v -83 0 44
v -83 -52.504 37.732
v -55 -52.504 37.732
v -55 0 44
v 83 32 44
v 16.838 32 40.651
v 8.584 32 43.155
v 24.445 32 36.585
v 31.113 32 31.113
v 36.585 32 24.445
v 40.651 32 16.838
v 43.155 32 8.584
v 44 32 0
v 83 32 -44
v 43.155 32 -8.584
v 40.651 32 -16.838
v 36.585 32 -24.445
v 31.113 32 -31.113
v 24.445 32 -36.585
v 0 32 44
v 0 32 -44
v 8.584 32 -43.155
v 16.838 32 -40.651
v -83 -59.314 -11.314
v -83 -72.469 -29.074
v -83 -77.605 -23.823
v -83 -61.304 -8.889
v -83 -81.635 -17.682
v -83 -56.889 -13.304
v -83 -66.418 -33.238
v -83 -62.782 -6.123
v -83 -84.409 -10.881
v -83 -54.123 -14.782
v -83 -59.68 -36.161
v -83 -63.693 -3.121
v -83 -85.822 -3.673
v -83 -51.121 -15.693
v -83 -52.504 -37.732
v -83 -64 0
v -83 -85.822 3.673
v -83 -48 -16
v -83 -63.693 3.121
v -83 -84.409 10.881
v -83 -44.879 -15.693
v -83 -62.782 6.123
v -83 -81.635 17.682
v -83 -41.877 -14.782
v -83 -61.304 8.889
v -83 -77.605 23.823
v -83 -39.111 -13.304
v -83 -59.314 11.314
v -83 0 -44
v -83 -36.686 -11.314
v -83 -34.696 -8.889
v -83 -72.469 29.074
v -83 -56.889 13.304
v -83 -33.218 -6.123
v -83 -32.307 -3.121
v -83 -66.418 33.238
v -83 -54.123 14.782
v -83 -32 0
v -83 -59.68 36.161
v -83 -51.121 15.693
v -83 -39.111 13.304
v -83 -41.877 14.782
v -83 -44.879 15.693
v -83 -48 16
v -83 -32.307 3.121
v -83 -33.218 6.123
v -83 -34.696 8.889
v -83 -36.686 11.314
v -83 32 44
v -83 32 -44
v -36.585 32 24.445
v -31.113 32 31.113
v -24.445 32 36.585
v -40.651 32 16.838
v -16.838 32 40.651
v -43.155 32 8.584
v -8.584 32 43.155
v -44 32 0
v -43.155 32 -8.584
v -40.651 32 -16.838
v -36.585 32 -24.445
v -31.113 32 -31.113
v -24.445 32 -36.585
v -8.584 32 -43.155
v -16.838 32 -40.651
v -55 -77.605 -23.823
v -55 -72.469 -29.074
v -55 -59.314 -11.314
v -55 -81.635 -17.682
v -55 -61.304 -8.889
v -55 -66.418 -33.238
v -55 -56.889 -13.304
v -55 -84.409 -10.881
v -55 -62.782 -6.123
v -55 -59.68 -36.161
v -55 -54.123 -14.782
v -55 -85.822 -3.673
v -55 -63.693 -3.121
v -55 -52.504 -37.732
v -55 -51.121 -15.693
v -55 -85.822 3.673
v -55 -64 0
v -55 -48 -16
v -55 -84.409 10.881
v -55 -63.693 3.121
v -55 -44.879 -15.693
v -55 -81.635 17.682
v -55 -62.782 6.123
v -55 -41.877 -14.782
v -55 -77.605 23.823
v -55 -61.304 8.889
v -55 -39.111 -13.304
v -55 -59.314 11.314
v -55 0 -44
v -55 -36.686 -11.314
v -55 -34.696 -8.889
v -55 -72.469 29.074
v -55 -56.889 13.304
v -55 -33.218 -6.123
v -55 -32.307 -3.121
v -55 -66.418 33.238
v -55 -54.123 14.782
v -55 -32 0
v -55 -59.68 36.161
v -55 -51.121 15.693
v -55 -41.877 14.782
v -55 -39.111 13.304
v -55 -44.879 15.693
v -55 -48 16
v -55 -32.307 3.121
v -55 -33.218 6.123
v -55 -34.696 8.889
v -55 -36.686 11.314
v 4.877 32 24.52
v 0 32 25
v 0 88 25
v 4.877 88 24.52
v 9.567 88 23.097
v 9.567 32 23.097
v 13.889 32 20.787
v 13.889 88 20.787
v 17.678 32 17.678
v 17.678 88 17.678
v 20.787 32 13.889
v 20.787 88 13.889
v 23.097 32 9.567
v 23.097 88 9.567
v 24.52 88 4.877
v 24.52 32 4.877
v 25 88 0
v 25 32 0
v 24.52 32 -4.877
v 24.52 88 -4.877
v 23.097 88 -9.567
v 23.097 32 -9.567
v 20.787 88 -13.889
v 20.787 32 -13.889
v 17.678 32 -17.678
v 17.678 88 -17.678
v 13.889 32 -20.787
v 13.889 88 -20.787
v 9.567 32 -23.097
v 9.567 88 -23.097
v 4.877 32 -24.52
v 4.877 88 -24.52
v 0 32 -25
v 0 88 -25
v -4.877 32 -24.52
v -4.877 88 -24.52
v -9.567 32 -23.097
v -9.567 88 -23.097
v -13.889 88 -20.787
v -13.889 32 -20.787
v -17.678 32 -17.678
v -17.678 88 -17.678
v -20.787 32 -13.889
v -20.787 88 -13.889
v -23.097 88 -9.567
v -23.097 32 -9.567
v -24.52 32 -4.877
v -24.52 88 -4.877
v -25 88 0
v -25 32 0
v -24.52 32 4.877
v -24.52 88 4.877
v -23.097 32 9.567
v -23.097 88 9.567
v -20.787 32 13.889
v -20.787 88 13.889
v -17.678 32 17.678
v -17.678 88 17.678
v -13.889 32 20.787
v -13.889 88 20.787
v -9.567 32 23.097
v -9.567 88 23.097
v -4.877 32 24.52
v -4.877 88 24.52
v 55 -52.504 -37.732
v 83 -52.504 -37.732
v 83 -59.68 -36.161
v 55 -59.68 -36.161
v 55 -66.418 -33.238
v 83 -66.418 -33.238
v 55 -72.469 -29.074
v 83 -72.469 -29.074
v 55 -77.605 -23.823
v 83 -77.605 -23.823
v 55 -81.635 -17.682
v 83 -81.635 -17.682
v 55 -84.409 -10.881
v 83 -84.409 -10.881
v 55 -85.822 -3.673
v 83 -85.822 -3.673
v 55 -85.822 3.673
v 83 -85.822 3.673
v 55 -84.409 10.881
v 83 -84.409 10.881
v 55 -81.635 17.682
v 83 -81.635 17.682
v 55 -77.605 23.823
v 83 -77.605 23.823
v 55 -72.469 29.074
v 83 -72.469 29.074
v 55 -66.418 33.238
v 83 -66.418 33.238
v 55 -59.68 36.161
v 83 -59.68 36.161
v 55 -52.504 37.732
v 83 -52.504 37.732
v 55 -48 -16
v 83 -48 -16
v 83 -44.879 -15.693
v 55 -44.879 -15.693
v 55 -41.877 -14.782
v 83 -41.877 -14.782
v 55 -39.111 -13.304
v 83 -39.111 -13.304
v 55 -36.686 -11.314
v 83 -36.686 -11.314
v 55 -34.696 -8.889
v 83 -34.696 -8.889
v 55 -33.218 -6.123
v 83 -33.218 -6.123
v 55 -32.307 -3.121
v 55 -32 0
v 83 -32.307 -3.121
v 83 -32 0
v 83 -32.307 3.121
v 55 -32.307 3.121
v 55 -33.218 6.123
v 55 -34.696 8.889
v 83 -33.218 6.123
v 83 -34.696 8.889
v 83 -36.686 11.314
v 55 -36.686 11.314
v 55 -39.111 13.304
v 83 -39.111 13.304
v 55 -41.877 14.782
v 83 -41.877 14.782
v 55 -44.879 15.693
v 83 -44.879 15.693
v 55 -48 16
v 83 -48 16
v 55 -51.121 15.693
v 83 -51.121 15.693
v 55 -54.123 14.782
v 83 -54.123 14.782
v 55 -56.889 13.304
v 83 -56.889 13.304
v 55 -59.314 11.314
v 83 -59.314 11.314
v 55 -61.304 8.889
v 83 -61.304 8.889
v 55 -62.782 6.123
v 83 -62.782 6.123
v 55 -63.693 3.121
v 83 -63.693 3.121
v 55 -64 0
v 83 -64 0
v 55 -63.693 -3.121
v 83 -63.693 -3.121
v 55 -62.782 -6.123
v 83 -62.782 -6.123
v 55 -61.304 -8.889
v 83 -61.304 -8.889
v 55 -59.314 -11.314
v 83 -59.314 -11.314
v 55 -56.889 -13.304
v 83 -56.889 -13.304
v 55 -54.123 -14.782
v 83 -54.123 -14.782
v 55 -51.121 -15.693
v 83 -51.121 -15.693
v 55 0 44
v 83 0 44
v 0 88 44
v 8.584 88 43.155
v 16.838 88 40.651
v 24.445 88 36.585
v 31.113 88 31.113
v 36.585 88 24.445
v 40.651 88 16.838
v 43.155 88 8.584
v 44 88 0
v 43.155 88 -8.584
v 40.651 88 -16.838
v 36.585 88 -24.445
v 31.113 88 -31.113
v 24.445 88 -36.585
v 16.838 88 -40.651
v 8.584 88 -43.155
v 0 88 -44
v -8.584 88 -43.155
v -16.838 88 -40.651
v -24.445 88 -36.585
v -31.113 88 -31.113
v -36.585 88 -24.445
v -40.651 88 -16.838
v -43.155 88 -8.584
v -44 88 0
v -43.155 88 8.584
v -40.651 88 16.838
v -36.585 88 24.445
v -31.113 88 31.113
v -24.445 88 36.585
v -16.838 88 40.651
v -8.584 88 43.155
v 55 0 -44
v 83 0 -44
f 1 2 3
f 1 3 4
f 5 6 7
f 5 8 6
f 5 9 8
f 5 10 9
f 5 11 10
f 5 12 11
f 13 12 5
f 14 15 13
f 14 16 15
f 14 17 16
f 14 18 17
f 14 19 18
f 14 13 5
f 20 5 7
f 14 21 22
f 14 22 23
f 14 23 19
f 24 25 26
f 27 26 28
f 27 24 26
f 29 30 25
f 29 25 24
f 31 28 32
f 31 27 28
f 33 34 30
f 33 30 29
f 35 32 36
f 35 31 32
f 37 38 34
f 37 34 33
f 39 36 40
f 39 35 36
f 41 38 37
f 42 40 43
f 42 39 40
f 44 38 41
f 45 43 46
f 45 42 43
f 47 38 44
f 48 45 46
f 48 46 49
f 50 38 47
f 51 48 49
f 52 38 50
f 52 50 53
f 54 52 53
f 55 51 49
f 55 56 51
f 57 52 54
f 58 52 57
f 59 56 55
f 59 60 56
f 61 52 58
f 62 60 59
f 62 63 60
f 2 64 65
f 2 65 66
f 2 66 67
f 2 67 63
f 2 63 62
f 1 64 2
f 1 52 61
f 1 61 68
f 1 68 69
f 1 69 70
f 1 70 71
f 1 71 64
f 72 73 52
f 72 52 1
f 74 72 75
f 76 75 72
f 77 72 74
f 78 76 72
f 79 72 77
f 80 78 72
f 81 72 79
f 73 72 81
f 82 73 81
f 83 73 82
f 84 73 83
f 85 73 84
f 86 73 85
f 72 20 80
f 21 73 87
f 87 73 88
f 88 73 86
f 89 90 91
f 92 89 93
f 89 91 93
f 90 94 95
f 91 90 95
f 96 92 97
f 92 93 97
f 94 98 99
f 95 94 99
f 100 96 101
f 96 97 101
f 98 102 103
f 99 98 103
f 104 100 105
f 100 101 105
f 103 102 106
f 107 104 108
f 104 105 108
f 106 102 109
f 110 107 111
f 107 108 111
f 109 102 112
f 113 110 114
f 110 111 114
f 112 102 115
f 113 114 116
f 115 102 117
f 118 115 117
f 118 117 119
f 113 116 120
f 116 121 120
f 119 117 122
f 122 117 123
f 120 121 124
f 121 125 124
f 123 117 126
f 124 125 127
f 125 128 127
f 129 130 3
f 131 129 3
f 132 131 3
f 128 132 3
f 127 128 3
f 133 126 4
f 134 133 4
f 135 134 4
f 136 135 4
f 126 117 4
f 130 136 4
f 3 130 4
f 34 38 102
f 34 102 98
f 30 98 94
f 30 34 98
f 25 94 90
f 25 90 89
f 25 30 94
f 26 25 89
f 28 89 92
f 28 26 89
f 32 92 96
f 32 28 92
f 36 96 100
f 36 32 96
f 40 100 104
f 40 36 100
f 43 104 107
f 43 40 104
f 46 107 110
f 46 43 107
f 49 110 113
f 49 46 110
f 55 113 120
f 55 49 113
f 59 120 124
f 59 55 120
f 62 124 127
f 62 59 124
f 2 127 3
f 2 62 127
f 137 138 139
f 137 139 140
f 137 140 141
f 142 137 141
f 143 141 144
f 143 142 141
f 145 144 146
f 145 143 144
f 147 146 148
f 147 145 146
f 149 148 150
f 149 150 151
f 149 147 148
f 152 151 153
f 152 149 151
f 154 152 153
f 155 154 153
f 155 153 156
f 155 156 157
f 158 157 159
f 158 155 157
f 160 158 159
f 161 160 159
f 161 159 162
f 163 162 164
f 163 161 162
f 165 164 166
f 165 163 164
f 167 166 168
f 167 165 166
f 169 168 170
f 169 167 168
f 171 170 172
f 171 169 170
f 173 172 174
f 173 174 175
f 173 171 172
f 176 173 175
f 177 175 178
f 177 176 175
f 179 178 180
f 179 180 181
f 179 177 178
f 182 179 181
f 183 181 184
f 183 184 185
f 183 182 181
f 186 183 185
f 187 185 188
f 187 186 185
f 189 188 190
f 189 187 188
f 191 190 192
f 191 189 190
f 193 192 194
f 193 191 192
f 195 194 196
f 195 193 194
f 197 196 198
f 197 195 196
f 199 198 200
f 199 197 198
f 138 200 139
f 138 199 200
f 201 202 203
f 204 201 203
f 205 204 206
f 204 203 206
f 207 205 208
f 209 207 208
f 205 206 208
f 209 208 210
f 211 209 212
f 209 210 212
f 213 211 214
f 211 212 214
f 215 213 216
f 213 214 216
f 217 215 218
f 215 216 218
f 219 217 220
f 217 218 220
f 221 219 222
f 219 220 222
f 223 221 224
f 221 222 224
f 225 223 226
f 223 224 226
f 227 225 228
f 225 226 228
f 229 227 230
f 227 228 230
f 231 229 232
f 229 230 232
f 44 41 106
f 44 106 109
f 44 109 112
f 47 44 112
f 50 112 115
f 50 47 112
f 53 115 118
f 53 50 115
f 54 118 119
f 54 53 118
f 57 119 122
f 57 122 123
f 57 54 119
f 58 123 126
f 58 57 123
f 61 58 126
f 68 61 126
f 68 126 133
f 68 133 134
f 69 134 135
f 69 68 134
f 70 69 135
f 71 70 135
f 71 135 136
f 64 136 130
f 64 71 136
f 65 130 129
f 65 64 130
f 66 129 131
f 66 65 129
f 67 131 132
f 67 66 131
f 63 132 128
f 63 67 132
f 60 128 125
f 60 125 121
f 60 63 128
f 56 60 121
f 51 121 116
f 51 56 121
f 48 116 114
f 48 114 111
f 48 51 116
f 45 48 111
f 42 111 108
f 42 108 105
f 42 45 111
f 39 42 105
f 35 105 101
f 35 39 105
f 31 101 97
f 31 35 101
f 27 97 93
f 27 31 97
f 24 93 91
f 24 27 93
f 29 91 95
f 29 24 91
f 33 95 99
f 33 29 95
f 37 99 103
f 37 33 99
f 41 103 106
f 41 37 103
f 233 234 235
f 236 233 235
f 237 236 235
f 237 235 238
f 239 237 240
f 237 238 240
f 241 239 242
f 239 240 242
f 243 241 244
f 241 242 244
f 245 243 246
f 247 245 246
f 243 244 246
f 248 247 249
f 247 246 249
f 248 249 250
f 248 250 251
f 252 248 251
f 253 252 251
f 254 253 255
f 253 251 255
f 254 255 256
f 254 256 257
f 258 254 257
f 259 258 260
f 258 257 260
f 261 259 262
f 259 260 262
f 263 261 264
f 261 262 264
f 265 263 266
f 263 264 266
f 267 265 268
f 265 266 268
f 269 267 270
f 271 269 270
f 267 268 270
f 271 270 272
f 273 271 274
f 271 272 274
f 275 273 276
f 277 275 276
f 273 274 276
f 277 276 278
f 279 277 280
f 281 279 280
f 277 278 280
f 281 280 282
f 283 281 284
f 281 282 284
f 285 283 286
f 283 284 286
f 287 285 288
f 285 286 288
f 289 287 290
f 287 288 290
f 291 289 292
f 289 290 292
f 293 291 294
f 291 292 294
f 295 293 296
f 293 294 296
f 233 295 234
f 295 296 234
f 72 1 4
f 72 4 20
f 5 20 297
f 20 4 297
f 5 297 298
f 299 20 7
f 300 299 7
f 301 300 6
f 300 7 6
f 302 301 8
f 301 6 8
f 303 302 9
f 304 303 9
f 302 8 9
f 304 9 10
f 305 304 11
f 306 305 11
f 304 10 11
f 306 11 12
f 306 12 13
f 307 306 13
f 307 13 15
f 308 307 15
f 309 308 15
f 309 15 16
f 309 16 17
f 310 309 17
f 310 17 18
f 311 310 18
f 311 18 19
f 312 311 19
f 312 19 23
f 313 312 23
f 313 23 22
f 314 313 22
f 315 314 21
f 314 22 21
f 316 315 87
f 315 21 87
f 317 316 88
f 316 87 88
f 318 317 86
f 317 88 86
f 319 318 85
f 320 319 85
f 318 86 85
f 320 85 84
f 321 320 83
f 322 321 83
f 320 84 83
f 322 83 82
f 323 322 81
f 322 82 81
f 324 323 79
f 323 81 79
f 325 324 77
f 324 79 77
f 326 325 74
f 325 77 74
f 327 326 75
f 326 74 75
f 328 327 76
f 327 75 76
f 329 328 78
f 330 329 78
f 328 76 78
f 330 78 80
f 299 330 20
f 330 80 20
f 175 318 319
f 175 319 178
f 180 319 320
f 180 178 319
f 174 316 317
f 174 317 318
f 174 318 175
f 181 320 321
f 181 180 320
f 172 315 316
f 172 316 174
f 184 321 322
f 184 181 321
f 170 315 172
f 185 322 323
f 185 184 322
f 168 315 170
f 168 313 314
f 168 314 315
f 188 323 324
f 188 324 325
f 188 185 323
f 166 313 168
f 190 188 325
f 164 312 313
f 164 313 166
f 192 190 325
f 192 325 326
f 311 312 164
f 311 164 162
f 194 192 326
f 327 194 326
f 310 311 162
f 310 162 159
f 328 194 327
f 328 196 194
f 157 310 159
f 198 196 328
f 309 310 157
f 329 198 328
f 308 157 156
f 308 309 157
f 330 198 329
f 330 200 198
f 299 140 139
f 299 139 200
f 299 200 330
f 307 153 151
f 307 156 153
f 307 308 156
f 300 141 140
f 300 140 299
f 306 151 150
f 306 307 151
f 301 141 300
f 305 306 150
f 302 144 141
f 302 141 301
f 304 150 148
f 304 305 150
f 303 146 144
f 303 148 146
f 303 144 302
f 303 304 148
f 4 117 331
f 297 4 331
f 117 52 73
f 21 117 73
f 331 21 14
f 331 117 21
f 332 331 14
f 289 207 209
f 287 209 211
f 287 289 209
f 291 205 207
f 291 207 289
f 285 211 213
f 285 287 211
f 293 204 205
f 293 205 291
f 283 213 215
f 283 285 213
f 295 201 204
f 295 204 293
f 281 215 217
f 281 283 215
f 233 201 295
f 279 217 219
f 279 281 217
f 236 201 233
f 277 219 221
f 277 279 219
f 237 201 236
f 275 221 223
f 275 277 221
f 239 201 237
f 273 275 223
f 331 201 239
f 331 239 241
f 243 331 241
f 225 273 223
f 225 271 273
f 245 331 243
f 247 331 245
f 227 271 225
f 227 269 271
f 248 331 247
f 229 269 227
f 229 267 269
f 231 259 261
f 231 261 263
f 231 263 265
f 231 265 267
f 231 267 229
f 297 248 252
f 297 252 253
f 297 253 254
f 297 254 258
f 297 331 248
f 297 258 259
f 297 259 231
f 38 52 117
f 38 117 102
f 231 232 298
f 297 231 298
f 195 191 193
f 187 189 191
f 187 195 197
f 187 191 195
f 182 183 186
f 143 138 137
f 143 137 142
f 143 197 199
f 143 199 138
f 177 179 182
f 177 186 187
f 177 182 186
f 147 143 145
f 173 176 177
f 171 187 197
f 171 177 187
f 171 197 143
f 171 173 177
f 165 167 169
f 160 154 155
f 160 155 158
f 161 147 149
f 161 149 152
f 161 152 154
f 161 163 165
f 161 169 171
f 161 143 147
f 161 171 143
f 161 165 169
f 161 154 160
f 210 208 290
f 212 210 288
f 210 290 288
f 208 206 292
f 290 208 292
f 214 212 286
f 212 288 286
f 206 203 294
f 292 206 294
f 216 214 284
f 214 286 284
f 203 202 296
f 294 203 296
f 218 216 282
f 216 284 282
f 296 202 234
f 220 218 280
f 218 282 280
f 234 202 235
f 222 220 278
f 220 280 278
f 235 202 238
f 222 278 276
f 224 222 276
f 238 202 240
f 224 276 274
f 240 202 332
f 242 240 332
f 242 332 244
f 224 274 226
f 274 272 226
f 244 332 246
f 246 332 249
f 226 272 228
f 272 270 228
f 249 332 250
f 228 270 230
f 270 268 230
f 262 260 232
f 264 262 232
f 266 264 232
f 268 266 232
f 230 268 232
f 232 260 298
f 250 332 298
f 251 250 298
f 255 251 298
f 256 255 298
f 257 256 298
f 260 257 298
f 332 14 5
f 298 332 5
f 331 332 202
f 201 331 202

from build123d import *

# Parameters (mm, degrees)
SKETCH1_W           = 166
SKETCH1_H           = 88
BOSS_EXTRUDE1_DEPTH = 32
SKETCH2_R           = 44
SKETCH2_R_2         = 25
BOSS_EXTRUDE2_DEPTH = 56
SKETCH3_R           = 16
BOSS_EXTRUDE3_DEPTH = 28


with BuildPart() as part:
    # Sketch1 → Boss-Extrude1 (new body)
    with BuildSketch(Plane(origin=(0, 0, 0), x_dir=(1, 0, 0), z_dir=(0, 1, 0))):
        Rectangle(SKETCH1_W, SKETCH1_H)
    extrude(amount=BOSS_EXTRUDE1_DEPTH)

    # Sketch2 → Boss-Extrude2 (add)
    with BuildSketch(Plane(origin=(0, 32, 0), x_dir=(1, 0, 0), z_dir=(0, 1, 0))):
        with Locations(Location((0, 0, 0), (0, 0, 270))):
            Circle(SKETCH2_R)
        with Locations(Location((0, 0, 0), (0, 0, 270))):
            Circle(SKETCH2_R_2, mode=Mode.SUBTRACT)
    extrude(amount=BOSS_EXTRUDE2_DEPTH)

    # Sketch3 → Boss-Extrude3 (add)
    with BuildSketch(Plane(origin=(83, 0, 0), x_dir=(0, 0, -1), z_dir=(1, 0, 0))):
        with BuildLine():
            Line((-37.732085488, -52.504411697), (-44, 0))
            Line((-44, 0), (44, 0))
            Line((44, 0), (37.732085488, -52.504411697))
            ThreePointArc((37.732085488, -52.504411697), (0, -86), (-37.732085488, -52.504411697))
        make_face()
        with Locations((0, -48)):
            Circle(SKETCH3_R, mode=Mode.SUBTRACT)
    boss_extrude3 = extrude(amount=-BOSS_EXTRUDE3_DEPTH)

    # Mirror1: Boss-Extrude3 across plane
    add(boss_extrude3.mirror(Plane(origin=(0, 0, 0), x_dir=(0, 0, 1), z_dir=(1, 0, 0))))


solid = part.part
